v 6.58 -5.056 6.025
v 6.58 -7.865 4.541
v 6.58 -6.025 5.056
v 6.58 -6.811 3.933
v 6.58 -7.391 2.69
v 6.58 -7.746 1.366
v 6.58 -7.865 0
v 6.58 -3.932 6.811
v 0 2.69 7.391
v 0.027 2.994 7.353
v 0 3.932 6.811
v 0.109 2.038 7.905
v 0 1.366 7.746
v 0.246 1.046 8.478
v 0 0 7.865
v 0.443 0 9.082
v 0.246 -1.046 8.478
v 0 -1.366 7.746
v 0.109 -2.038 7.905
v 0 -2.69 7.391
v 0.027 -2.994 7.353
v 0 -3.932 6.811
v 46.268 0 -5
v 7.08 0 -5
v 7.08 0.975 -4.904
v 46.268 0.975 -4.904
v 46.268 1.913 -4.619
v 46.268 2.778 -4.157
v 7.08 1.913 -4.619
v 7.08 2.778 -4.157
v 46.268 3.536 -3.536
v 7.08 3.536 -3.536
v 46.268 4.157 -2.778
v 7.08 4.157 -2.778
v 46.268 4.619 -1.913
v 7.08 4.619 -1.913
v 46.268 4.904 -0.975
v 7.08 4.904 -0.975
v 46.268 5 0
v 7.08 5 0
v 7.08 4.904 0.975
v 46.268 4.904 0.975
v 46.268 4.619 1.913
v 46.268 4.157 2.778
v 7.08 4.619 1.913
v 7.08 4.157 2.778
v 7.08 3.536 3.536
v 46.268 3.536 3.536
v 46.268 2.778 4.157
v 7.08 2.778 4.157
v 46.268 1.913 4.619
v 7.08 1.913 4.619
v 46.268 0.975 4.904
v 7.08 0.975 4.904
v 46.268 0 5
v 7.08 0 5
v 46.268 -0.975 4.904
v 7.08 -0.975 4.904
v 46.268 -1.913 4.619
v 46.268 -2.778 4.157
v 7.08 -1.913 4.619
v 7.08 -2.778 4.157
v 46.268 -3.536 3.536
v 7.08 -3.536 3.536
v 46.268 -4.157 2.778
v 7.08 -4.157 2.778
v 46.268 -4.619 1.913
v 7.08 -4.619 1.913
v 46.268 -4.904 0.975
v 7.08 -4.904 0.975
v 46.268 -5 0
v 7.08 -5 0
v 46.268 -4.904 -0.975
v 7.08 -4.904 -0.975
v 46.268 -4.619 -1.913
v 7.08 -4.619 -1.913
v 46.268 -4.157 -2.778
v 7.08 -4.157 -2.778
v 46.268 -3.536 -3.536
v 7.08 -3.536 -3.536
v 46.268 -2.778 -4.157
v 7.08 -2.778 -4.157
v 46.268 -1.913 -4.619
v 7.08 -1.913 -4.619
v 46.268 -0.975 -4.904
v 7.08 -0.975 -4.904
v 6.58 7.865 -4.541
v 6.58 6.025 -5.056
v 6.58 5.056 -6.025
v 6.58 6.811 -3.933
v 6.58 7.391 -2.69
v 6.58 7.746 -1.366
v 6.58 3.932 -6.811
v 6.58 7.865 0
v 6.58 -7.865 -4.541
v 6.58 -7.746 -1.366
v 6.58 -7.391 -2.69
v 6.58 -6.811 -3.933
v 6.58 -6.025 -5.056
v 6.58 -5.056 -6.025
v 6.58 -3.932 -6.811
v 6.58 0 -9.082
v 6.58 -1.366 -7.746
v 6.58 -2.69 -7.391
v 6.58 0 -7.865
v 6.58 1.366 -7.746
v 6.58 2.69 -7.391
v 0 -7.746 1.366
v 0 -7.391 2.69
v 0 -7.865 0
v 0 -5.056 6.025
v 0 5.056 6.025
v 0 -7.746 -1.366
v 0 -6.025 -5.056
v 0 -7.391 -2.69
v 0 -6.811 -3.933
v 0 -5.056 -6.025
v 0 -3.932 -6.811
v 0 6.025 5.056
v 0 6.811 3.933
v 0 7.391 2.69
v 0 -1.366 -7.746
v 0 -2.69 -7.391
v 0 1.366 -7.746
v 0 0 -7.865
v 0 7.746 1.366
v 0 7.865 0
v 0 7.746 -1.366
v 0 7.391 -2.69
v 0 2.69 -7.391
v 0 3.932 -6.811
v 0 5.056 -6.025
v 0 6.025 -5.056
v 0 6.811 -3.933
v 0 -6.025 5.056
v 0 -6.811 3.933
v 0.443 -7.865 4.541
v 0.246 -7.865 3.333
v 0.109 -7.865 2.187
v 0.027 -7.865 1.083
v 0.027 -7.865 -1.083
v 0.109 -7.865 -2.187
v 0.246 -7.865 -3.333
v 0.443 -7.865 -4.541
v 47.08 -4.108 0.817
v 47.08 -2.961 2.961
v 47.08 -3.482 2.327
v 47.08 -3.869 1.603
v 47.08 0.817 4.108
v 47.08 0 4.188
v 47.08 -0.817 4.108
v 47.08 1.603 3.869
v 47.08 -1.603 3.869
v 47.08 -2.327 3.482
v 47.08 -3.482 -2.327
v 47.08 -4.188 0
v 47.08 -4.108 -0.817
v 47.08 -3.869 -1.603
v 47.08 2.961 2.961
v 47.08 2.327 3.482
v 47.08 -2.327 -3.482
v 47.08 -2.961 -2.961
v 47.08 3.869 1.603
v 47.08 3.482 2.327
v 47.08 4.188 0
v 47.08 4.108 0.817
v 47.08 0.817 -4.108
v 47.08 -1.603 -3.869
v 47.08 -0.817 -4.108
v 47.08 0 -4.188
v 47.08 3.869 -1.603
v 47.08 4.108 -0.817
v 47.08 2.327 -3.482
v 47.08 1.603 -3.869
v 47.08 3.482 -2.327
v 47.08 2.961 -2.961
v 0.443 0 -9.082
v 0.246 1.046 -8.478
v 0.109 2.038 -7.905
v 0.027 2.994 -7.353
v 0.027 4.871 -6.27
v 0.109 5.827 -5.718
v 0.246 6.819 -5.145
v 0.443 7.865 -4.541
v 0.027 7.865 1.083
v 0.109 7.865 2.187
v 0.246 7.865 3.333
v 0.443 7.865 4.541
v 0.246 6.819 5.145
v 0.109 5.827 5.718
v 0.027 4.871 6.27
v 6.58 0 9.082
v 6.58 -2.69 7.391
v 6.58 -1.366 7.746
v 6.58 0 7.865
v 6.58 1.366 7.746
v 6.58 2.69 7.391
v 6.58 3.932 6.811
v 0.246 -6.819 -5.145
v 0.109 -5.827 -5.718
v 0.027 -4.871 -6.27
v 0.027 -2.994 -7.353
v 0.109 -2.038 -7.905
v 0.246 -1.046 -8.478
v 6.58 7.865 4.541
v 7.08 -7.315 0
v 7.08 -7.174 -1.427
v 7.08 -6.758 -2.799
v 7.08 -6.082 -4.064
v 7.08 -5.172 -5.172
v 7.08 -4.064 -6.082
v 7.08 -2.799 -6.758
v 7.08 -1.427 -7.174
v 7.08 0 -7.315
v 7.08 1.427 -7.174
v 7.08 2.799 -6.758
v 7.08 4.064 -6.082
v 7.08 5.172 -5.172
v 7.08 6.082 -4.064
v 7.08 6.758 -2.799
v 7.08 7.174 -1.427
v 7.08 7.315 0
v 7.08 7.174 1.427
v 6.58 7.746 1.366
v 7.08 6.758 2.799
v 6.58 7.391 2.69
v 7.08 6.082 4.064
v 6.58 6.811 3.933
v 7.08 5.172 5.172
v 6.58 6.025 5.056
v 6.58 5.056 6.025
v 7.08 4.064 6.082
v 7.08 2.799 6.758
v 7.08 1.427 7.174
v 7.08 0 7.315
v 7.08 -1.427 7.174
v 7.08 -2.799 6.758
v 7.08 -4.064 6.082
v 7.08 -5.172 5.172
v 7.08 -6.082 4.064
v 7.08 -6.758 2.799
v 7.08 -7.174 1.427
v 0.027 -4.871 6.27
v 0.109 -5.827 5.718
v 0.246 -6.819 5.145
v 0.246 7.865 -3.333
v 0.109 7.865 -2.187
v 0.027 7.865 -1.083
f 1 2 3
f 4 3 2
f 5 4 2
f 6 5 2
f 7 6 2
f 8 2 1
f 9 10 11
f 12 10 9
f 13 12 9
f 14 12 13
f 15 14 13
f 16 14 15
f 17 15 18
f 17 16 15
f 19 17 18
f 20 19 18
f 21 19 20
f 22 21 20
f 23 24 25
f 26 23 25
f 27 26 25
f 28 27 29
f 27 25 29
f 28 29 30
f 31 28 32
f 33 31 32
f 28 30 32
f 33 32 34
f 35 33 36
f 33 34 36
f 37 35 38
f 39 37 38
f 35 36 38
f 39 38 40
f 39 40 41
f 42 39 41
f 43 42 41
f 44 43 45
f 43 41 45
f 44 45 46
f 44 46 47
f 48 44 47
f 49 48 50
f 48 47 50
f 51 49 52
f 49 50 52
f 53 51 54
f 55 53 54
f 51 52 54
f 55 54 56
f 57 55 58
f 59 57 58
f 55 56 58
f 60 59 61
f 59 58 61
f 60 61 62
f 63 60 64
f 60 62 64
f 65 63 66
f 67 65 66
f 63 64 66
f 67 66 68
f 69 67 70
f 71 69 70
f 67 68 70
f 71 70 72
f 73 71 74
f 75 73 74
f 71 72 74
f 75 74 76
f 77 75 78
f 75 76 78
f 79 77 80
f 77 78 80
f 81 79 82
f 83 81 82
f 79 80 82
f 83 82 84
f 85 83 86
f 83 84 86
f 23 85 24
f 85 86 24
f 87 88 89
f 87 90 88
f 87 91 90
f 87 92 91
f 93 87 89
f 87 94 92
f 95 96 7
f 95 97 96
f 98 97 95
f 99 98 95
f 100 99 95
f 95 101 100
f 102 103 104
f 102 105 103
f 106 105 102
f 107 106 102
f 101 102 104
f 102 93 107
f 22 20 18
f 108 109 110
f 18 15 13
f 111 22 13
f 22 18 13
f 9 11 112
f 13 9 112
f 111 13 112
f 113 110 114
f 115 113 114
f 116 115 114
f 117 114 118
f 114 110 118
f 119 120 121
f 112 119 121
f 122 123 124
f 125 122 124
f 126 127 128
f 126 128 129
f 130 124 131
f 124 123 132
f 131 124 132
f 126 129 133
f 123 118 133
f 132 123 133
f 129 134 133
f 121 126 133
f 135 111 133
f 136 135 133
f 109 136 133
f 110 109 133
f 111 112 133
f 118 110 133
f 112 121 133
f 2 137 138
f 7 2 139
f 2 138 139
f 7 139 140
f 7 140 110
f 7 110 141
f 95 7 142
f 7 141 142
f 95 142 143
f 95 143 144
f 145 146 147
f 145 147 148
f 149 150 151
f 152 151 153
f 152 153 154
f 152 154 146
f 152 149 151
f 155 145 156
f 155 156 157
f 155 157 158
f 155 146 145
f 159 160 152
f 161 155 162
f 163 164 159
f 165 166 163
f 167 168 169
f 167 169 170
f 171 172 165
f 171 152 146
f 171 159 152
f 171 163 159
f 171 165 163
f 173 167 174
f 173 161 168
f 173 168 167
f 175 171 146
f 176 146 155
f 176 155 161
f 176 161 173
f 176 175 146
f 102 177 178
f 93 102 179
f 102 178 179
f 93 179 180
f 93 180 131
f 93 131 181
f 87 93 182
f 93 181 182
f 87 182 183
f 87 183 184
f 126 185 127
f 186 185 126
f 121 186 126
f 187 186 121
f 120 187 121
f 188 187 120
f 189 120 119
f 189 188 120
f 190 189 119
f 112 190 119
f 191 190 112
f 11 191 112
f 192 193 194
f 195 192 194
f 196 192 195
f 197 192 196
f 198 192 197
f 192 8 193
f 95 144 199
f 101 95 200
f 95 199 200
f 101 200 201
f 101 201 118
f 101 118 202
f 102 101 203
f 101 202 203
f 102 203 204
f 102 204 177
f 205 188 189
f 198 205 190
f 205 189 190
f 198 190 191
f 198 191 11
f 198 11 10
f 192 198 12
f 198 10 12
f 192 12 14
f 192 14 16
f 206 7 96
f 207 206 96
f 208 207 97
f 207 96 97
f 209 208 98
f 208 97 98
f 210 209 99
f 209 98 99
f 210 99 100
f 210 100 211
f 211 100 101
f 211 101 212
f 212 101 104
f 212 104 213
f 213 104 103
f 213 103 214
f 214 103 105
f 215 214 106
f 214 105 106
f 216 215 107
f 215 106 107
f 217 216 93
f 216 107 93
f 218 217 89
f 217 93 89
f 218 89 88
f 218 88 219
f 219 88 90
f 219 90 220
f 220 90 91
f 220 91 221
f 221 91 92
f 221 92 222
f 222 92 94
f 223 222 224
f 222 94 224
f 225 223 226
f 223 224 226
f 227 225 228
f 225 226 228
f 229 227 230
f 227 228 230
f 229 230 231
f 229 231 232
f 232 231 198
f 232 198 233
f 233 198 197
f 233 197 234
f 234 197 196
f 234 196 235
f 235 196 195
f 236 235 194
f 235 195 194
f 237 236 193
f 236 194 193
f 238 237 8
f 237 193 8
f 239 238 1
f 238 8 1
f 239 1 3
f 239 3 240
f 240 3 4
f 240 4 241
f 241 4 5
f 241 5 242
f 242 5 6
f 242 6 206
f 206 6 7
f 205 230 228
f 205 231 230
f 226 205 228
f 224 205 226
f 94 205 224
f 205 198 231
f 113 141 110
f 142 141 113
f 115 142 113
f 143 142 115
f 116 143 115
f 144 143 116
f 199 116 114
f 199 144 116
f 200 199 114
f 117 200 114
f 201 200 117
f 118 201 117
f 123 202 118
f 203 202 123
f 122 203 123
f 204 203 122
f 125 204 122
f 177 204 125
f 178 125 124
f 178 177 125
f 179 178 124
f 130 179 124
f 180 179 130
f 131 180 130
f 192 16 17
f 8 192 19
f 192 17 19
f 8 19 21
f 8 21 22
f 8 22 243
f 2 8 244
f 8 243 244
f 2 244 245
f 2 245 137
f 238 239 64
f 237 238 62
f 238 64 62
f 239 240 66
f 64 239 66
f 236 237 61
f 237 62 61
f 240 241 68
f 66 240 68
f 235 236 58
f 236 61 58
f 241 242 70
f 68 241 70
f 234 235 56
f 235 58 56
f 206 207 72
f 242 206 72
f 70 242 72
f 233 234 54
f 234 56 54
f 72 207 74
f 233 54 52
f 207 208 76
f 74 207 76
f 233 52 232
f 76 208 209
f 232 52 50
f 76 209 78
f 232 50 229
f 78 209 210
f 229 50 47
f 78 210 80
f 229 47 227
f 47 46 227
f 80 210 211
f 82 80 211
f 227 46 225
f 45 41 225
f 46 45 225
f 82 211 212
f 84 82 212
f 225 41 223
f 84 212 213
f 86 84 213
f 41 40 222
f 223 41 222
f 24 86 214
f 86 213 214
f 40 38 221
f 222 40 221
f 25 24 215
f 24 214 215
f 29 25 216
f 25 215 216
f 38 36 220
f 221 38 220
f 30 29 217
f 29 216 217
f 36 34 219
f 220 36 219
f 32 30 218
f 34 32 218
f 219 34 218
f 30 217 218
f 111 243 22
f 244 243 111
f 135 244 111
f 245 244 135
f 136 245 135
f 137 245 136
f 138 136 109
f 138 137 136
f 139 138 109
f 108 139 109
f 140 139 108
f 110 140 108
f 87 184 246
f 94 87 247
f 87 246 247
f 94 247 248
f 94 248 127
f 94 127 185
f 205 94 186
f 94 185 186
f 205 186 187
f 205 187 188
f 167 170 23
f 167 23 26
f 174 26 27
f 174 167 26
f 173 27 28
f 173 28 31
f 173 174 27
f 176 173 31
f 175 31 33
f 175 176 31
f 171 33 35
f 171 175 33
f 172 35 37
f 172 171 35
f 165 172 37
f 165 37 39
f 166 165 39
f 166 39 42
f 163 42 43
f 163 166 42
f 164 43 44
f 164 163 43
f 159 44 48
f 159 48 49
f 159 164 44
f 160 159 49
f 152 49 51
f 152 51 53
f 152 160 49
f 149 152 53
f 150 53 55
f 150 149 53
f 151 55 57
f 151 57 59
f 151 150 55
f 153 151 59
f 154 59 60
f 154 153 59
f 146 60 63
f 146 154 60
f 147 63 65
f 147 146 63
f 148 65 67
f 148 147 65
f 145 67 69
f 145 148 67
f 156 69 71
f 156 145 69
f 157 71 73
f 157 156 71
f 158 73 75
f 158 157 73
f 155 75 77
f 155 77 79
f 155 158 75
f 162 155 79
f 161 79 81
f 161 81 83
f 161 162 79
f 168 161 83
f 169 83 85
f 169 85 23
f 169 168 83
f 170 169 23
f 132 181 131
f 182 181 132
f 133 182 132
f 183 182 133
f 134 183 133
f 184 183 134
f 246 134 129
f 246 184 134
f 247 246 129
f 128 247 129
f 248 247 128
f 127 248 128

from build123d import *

# Parameters (mm, degrees)
BASEHEAD_DEPTH = 6.58
SKETCH3_R      = 5
BASEBODY_DEPTH = 40
CHAMFER1_SIZE  = 0.812


with BuildPart() as part:
    # Sketch-BaseHead → BaseHead (new body)
    with BuildSketch(Plane(origin=(0, 0, 0), x_dir=(0, 0, -1), z_dir=(1, 0, 0))):
        Polygon((9.081719734, 0), (4.540859867, 7.865), (-4.540859867, 7.865), (-9.081719734, 0), (-4.540859867, -7.865), (4.540859867, -7.865), align=None)
    extrude(amount=BASEHEAD_DEPTH)

    # Sketch4 → HeadChamfer (revolve, cut)
    with BuildSketch(Plane(origin=(-0.264637255, 0, 5.916896391), x_dir=(0, 0, -1), z_dir=(0, 1, 0))):
        Polygon((14.998616125, -0.264637255), (13.781896391, -0.264637255), (14.998616125, -0.707487022), align=None)
    revolve(axis=Axis((-4.001564945, 0, 0), (1, 0, 0)), mode=Mode.SUBTRACT)

    # Sketch1 → Revolve1 (revolve)
    with BuildSketch(Plane.XY):
        Polygon((6.58, 0), (7.08, 0), (7.08, -7.315), (6.58, -7.865), align=None)
    revolve(axis=Axis((-4.001564945, 0, 0), (1, 0, 0)))

    # Sketch3 → BaseBody (add)
    with BuildSketch(Plane(origin=(7.08, 0, 0), x_dir=(0, 0, -1), z_dir=(1, 0, 0))):
        Circle(SKETCH3_R)
    extrude(amount=BASEBODY_DEPTH)

    # Chamfer1
    chamfer1_edges = [part.edges().sort_by_distance(p)[0] for p in [
        (47.08, 0, 5),
    ]]
    chamfer(chamfer1_edges, length=CHAMFER1_SIZE)


solid = part.part
